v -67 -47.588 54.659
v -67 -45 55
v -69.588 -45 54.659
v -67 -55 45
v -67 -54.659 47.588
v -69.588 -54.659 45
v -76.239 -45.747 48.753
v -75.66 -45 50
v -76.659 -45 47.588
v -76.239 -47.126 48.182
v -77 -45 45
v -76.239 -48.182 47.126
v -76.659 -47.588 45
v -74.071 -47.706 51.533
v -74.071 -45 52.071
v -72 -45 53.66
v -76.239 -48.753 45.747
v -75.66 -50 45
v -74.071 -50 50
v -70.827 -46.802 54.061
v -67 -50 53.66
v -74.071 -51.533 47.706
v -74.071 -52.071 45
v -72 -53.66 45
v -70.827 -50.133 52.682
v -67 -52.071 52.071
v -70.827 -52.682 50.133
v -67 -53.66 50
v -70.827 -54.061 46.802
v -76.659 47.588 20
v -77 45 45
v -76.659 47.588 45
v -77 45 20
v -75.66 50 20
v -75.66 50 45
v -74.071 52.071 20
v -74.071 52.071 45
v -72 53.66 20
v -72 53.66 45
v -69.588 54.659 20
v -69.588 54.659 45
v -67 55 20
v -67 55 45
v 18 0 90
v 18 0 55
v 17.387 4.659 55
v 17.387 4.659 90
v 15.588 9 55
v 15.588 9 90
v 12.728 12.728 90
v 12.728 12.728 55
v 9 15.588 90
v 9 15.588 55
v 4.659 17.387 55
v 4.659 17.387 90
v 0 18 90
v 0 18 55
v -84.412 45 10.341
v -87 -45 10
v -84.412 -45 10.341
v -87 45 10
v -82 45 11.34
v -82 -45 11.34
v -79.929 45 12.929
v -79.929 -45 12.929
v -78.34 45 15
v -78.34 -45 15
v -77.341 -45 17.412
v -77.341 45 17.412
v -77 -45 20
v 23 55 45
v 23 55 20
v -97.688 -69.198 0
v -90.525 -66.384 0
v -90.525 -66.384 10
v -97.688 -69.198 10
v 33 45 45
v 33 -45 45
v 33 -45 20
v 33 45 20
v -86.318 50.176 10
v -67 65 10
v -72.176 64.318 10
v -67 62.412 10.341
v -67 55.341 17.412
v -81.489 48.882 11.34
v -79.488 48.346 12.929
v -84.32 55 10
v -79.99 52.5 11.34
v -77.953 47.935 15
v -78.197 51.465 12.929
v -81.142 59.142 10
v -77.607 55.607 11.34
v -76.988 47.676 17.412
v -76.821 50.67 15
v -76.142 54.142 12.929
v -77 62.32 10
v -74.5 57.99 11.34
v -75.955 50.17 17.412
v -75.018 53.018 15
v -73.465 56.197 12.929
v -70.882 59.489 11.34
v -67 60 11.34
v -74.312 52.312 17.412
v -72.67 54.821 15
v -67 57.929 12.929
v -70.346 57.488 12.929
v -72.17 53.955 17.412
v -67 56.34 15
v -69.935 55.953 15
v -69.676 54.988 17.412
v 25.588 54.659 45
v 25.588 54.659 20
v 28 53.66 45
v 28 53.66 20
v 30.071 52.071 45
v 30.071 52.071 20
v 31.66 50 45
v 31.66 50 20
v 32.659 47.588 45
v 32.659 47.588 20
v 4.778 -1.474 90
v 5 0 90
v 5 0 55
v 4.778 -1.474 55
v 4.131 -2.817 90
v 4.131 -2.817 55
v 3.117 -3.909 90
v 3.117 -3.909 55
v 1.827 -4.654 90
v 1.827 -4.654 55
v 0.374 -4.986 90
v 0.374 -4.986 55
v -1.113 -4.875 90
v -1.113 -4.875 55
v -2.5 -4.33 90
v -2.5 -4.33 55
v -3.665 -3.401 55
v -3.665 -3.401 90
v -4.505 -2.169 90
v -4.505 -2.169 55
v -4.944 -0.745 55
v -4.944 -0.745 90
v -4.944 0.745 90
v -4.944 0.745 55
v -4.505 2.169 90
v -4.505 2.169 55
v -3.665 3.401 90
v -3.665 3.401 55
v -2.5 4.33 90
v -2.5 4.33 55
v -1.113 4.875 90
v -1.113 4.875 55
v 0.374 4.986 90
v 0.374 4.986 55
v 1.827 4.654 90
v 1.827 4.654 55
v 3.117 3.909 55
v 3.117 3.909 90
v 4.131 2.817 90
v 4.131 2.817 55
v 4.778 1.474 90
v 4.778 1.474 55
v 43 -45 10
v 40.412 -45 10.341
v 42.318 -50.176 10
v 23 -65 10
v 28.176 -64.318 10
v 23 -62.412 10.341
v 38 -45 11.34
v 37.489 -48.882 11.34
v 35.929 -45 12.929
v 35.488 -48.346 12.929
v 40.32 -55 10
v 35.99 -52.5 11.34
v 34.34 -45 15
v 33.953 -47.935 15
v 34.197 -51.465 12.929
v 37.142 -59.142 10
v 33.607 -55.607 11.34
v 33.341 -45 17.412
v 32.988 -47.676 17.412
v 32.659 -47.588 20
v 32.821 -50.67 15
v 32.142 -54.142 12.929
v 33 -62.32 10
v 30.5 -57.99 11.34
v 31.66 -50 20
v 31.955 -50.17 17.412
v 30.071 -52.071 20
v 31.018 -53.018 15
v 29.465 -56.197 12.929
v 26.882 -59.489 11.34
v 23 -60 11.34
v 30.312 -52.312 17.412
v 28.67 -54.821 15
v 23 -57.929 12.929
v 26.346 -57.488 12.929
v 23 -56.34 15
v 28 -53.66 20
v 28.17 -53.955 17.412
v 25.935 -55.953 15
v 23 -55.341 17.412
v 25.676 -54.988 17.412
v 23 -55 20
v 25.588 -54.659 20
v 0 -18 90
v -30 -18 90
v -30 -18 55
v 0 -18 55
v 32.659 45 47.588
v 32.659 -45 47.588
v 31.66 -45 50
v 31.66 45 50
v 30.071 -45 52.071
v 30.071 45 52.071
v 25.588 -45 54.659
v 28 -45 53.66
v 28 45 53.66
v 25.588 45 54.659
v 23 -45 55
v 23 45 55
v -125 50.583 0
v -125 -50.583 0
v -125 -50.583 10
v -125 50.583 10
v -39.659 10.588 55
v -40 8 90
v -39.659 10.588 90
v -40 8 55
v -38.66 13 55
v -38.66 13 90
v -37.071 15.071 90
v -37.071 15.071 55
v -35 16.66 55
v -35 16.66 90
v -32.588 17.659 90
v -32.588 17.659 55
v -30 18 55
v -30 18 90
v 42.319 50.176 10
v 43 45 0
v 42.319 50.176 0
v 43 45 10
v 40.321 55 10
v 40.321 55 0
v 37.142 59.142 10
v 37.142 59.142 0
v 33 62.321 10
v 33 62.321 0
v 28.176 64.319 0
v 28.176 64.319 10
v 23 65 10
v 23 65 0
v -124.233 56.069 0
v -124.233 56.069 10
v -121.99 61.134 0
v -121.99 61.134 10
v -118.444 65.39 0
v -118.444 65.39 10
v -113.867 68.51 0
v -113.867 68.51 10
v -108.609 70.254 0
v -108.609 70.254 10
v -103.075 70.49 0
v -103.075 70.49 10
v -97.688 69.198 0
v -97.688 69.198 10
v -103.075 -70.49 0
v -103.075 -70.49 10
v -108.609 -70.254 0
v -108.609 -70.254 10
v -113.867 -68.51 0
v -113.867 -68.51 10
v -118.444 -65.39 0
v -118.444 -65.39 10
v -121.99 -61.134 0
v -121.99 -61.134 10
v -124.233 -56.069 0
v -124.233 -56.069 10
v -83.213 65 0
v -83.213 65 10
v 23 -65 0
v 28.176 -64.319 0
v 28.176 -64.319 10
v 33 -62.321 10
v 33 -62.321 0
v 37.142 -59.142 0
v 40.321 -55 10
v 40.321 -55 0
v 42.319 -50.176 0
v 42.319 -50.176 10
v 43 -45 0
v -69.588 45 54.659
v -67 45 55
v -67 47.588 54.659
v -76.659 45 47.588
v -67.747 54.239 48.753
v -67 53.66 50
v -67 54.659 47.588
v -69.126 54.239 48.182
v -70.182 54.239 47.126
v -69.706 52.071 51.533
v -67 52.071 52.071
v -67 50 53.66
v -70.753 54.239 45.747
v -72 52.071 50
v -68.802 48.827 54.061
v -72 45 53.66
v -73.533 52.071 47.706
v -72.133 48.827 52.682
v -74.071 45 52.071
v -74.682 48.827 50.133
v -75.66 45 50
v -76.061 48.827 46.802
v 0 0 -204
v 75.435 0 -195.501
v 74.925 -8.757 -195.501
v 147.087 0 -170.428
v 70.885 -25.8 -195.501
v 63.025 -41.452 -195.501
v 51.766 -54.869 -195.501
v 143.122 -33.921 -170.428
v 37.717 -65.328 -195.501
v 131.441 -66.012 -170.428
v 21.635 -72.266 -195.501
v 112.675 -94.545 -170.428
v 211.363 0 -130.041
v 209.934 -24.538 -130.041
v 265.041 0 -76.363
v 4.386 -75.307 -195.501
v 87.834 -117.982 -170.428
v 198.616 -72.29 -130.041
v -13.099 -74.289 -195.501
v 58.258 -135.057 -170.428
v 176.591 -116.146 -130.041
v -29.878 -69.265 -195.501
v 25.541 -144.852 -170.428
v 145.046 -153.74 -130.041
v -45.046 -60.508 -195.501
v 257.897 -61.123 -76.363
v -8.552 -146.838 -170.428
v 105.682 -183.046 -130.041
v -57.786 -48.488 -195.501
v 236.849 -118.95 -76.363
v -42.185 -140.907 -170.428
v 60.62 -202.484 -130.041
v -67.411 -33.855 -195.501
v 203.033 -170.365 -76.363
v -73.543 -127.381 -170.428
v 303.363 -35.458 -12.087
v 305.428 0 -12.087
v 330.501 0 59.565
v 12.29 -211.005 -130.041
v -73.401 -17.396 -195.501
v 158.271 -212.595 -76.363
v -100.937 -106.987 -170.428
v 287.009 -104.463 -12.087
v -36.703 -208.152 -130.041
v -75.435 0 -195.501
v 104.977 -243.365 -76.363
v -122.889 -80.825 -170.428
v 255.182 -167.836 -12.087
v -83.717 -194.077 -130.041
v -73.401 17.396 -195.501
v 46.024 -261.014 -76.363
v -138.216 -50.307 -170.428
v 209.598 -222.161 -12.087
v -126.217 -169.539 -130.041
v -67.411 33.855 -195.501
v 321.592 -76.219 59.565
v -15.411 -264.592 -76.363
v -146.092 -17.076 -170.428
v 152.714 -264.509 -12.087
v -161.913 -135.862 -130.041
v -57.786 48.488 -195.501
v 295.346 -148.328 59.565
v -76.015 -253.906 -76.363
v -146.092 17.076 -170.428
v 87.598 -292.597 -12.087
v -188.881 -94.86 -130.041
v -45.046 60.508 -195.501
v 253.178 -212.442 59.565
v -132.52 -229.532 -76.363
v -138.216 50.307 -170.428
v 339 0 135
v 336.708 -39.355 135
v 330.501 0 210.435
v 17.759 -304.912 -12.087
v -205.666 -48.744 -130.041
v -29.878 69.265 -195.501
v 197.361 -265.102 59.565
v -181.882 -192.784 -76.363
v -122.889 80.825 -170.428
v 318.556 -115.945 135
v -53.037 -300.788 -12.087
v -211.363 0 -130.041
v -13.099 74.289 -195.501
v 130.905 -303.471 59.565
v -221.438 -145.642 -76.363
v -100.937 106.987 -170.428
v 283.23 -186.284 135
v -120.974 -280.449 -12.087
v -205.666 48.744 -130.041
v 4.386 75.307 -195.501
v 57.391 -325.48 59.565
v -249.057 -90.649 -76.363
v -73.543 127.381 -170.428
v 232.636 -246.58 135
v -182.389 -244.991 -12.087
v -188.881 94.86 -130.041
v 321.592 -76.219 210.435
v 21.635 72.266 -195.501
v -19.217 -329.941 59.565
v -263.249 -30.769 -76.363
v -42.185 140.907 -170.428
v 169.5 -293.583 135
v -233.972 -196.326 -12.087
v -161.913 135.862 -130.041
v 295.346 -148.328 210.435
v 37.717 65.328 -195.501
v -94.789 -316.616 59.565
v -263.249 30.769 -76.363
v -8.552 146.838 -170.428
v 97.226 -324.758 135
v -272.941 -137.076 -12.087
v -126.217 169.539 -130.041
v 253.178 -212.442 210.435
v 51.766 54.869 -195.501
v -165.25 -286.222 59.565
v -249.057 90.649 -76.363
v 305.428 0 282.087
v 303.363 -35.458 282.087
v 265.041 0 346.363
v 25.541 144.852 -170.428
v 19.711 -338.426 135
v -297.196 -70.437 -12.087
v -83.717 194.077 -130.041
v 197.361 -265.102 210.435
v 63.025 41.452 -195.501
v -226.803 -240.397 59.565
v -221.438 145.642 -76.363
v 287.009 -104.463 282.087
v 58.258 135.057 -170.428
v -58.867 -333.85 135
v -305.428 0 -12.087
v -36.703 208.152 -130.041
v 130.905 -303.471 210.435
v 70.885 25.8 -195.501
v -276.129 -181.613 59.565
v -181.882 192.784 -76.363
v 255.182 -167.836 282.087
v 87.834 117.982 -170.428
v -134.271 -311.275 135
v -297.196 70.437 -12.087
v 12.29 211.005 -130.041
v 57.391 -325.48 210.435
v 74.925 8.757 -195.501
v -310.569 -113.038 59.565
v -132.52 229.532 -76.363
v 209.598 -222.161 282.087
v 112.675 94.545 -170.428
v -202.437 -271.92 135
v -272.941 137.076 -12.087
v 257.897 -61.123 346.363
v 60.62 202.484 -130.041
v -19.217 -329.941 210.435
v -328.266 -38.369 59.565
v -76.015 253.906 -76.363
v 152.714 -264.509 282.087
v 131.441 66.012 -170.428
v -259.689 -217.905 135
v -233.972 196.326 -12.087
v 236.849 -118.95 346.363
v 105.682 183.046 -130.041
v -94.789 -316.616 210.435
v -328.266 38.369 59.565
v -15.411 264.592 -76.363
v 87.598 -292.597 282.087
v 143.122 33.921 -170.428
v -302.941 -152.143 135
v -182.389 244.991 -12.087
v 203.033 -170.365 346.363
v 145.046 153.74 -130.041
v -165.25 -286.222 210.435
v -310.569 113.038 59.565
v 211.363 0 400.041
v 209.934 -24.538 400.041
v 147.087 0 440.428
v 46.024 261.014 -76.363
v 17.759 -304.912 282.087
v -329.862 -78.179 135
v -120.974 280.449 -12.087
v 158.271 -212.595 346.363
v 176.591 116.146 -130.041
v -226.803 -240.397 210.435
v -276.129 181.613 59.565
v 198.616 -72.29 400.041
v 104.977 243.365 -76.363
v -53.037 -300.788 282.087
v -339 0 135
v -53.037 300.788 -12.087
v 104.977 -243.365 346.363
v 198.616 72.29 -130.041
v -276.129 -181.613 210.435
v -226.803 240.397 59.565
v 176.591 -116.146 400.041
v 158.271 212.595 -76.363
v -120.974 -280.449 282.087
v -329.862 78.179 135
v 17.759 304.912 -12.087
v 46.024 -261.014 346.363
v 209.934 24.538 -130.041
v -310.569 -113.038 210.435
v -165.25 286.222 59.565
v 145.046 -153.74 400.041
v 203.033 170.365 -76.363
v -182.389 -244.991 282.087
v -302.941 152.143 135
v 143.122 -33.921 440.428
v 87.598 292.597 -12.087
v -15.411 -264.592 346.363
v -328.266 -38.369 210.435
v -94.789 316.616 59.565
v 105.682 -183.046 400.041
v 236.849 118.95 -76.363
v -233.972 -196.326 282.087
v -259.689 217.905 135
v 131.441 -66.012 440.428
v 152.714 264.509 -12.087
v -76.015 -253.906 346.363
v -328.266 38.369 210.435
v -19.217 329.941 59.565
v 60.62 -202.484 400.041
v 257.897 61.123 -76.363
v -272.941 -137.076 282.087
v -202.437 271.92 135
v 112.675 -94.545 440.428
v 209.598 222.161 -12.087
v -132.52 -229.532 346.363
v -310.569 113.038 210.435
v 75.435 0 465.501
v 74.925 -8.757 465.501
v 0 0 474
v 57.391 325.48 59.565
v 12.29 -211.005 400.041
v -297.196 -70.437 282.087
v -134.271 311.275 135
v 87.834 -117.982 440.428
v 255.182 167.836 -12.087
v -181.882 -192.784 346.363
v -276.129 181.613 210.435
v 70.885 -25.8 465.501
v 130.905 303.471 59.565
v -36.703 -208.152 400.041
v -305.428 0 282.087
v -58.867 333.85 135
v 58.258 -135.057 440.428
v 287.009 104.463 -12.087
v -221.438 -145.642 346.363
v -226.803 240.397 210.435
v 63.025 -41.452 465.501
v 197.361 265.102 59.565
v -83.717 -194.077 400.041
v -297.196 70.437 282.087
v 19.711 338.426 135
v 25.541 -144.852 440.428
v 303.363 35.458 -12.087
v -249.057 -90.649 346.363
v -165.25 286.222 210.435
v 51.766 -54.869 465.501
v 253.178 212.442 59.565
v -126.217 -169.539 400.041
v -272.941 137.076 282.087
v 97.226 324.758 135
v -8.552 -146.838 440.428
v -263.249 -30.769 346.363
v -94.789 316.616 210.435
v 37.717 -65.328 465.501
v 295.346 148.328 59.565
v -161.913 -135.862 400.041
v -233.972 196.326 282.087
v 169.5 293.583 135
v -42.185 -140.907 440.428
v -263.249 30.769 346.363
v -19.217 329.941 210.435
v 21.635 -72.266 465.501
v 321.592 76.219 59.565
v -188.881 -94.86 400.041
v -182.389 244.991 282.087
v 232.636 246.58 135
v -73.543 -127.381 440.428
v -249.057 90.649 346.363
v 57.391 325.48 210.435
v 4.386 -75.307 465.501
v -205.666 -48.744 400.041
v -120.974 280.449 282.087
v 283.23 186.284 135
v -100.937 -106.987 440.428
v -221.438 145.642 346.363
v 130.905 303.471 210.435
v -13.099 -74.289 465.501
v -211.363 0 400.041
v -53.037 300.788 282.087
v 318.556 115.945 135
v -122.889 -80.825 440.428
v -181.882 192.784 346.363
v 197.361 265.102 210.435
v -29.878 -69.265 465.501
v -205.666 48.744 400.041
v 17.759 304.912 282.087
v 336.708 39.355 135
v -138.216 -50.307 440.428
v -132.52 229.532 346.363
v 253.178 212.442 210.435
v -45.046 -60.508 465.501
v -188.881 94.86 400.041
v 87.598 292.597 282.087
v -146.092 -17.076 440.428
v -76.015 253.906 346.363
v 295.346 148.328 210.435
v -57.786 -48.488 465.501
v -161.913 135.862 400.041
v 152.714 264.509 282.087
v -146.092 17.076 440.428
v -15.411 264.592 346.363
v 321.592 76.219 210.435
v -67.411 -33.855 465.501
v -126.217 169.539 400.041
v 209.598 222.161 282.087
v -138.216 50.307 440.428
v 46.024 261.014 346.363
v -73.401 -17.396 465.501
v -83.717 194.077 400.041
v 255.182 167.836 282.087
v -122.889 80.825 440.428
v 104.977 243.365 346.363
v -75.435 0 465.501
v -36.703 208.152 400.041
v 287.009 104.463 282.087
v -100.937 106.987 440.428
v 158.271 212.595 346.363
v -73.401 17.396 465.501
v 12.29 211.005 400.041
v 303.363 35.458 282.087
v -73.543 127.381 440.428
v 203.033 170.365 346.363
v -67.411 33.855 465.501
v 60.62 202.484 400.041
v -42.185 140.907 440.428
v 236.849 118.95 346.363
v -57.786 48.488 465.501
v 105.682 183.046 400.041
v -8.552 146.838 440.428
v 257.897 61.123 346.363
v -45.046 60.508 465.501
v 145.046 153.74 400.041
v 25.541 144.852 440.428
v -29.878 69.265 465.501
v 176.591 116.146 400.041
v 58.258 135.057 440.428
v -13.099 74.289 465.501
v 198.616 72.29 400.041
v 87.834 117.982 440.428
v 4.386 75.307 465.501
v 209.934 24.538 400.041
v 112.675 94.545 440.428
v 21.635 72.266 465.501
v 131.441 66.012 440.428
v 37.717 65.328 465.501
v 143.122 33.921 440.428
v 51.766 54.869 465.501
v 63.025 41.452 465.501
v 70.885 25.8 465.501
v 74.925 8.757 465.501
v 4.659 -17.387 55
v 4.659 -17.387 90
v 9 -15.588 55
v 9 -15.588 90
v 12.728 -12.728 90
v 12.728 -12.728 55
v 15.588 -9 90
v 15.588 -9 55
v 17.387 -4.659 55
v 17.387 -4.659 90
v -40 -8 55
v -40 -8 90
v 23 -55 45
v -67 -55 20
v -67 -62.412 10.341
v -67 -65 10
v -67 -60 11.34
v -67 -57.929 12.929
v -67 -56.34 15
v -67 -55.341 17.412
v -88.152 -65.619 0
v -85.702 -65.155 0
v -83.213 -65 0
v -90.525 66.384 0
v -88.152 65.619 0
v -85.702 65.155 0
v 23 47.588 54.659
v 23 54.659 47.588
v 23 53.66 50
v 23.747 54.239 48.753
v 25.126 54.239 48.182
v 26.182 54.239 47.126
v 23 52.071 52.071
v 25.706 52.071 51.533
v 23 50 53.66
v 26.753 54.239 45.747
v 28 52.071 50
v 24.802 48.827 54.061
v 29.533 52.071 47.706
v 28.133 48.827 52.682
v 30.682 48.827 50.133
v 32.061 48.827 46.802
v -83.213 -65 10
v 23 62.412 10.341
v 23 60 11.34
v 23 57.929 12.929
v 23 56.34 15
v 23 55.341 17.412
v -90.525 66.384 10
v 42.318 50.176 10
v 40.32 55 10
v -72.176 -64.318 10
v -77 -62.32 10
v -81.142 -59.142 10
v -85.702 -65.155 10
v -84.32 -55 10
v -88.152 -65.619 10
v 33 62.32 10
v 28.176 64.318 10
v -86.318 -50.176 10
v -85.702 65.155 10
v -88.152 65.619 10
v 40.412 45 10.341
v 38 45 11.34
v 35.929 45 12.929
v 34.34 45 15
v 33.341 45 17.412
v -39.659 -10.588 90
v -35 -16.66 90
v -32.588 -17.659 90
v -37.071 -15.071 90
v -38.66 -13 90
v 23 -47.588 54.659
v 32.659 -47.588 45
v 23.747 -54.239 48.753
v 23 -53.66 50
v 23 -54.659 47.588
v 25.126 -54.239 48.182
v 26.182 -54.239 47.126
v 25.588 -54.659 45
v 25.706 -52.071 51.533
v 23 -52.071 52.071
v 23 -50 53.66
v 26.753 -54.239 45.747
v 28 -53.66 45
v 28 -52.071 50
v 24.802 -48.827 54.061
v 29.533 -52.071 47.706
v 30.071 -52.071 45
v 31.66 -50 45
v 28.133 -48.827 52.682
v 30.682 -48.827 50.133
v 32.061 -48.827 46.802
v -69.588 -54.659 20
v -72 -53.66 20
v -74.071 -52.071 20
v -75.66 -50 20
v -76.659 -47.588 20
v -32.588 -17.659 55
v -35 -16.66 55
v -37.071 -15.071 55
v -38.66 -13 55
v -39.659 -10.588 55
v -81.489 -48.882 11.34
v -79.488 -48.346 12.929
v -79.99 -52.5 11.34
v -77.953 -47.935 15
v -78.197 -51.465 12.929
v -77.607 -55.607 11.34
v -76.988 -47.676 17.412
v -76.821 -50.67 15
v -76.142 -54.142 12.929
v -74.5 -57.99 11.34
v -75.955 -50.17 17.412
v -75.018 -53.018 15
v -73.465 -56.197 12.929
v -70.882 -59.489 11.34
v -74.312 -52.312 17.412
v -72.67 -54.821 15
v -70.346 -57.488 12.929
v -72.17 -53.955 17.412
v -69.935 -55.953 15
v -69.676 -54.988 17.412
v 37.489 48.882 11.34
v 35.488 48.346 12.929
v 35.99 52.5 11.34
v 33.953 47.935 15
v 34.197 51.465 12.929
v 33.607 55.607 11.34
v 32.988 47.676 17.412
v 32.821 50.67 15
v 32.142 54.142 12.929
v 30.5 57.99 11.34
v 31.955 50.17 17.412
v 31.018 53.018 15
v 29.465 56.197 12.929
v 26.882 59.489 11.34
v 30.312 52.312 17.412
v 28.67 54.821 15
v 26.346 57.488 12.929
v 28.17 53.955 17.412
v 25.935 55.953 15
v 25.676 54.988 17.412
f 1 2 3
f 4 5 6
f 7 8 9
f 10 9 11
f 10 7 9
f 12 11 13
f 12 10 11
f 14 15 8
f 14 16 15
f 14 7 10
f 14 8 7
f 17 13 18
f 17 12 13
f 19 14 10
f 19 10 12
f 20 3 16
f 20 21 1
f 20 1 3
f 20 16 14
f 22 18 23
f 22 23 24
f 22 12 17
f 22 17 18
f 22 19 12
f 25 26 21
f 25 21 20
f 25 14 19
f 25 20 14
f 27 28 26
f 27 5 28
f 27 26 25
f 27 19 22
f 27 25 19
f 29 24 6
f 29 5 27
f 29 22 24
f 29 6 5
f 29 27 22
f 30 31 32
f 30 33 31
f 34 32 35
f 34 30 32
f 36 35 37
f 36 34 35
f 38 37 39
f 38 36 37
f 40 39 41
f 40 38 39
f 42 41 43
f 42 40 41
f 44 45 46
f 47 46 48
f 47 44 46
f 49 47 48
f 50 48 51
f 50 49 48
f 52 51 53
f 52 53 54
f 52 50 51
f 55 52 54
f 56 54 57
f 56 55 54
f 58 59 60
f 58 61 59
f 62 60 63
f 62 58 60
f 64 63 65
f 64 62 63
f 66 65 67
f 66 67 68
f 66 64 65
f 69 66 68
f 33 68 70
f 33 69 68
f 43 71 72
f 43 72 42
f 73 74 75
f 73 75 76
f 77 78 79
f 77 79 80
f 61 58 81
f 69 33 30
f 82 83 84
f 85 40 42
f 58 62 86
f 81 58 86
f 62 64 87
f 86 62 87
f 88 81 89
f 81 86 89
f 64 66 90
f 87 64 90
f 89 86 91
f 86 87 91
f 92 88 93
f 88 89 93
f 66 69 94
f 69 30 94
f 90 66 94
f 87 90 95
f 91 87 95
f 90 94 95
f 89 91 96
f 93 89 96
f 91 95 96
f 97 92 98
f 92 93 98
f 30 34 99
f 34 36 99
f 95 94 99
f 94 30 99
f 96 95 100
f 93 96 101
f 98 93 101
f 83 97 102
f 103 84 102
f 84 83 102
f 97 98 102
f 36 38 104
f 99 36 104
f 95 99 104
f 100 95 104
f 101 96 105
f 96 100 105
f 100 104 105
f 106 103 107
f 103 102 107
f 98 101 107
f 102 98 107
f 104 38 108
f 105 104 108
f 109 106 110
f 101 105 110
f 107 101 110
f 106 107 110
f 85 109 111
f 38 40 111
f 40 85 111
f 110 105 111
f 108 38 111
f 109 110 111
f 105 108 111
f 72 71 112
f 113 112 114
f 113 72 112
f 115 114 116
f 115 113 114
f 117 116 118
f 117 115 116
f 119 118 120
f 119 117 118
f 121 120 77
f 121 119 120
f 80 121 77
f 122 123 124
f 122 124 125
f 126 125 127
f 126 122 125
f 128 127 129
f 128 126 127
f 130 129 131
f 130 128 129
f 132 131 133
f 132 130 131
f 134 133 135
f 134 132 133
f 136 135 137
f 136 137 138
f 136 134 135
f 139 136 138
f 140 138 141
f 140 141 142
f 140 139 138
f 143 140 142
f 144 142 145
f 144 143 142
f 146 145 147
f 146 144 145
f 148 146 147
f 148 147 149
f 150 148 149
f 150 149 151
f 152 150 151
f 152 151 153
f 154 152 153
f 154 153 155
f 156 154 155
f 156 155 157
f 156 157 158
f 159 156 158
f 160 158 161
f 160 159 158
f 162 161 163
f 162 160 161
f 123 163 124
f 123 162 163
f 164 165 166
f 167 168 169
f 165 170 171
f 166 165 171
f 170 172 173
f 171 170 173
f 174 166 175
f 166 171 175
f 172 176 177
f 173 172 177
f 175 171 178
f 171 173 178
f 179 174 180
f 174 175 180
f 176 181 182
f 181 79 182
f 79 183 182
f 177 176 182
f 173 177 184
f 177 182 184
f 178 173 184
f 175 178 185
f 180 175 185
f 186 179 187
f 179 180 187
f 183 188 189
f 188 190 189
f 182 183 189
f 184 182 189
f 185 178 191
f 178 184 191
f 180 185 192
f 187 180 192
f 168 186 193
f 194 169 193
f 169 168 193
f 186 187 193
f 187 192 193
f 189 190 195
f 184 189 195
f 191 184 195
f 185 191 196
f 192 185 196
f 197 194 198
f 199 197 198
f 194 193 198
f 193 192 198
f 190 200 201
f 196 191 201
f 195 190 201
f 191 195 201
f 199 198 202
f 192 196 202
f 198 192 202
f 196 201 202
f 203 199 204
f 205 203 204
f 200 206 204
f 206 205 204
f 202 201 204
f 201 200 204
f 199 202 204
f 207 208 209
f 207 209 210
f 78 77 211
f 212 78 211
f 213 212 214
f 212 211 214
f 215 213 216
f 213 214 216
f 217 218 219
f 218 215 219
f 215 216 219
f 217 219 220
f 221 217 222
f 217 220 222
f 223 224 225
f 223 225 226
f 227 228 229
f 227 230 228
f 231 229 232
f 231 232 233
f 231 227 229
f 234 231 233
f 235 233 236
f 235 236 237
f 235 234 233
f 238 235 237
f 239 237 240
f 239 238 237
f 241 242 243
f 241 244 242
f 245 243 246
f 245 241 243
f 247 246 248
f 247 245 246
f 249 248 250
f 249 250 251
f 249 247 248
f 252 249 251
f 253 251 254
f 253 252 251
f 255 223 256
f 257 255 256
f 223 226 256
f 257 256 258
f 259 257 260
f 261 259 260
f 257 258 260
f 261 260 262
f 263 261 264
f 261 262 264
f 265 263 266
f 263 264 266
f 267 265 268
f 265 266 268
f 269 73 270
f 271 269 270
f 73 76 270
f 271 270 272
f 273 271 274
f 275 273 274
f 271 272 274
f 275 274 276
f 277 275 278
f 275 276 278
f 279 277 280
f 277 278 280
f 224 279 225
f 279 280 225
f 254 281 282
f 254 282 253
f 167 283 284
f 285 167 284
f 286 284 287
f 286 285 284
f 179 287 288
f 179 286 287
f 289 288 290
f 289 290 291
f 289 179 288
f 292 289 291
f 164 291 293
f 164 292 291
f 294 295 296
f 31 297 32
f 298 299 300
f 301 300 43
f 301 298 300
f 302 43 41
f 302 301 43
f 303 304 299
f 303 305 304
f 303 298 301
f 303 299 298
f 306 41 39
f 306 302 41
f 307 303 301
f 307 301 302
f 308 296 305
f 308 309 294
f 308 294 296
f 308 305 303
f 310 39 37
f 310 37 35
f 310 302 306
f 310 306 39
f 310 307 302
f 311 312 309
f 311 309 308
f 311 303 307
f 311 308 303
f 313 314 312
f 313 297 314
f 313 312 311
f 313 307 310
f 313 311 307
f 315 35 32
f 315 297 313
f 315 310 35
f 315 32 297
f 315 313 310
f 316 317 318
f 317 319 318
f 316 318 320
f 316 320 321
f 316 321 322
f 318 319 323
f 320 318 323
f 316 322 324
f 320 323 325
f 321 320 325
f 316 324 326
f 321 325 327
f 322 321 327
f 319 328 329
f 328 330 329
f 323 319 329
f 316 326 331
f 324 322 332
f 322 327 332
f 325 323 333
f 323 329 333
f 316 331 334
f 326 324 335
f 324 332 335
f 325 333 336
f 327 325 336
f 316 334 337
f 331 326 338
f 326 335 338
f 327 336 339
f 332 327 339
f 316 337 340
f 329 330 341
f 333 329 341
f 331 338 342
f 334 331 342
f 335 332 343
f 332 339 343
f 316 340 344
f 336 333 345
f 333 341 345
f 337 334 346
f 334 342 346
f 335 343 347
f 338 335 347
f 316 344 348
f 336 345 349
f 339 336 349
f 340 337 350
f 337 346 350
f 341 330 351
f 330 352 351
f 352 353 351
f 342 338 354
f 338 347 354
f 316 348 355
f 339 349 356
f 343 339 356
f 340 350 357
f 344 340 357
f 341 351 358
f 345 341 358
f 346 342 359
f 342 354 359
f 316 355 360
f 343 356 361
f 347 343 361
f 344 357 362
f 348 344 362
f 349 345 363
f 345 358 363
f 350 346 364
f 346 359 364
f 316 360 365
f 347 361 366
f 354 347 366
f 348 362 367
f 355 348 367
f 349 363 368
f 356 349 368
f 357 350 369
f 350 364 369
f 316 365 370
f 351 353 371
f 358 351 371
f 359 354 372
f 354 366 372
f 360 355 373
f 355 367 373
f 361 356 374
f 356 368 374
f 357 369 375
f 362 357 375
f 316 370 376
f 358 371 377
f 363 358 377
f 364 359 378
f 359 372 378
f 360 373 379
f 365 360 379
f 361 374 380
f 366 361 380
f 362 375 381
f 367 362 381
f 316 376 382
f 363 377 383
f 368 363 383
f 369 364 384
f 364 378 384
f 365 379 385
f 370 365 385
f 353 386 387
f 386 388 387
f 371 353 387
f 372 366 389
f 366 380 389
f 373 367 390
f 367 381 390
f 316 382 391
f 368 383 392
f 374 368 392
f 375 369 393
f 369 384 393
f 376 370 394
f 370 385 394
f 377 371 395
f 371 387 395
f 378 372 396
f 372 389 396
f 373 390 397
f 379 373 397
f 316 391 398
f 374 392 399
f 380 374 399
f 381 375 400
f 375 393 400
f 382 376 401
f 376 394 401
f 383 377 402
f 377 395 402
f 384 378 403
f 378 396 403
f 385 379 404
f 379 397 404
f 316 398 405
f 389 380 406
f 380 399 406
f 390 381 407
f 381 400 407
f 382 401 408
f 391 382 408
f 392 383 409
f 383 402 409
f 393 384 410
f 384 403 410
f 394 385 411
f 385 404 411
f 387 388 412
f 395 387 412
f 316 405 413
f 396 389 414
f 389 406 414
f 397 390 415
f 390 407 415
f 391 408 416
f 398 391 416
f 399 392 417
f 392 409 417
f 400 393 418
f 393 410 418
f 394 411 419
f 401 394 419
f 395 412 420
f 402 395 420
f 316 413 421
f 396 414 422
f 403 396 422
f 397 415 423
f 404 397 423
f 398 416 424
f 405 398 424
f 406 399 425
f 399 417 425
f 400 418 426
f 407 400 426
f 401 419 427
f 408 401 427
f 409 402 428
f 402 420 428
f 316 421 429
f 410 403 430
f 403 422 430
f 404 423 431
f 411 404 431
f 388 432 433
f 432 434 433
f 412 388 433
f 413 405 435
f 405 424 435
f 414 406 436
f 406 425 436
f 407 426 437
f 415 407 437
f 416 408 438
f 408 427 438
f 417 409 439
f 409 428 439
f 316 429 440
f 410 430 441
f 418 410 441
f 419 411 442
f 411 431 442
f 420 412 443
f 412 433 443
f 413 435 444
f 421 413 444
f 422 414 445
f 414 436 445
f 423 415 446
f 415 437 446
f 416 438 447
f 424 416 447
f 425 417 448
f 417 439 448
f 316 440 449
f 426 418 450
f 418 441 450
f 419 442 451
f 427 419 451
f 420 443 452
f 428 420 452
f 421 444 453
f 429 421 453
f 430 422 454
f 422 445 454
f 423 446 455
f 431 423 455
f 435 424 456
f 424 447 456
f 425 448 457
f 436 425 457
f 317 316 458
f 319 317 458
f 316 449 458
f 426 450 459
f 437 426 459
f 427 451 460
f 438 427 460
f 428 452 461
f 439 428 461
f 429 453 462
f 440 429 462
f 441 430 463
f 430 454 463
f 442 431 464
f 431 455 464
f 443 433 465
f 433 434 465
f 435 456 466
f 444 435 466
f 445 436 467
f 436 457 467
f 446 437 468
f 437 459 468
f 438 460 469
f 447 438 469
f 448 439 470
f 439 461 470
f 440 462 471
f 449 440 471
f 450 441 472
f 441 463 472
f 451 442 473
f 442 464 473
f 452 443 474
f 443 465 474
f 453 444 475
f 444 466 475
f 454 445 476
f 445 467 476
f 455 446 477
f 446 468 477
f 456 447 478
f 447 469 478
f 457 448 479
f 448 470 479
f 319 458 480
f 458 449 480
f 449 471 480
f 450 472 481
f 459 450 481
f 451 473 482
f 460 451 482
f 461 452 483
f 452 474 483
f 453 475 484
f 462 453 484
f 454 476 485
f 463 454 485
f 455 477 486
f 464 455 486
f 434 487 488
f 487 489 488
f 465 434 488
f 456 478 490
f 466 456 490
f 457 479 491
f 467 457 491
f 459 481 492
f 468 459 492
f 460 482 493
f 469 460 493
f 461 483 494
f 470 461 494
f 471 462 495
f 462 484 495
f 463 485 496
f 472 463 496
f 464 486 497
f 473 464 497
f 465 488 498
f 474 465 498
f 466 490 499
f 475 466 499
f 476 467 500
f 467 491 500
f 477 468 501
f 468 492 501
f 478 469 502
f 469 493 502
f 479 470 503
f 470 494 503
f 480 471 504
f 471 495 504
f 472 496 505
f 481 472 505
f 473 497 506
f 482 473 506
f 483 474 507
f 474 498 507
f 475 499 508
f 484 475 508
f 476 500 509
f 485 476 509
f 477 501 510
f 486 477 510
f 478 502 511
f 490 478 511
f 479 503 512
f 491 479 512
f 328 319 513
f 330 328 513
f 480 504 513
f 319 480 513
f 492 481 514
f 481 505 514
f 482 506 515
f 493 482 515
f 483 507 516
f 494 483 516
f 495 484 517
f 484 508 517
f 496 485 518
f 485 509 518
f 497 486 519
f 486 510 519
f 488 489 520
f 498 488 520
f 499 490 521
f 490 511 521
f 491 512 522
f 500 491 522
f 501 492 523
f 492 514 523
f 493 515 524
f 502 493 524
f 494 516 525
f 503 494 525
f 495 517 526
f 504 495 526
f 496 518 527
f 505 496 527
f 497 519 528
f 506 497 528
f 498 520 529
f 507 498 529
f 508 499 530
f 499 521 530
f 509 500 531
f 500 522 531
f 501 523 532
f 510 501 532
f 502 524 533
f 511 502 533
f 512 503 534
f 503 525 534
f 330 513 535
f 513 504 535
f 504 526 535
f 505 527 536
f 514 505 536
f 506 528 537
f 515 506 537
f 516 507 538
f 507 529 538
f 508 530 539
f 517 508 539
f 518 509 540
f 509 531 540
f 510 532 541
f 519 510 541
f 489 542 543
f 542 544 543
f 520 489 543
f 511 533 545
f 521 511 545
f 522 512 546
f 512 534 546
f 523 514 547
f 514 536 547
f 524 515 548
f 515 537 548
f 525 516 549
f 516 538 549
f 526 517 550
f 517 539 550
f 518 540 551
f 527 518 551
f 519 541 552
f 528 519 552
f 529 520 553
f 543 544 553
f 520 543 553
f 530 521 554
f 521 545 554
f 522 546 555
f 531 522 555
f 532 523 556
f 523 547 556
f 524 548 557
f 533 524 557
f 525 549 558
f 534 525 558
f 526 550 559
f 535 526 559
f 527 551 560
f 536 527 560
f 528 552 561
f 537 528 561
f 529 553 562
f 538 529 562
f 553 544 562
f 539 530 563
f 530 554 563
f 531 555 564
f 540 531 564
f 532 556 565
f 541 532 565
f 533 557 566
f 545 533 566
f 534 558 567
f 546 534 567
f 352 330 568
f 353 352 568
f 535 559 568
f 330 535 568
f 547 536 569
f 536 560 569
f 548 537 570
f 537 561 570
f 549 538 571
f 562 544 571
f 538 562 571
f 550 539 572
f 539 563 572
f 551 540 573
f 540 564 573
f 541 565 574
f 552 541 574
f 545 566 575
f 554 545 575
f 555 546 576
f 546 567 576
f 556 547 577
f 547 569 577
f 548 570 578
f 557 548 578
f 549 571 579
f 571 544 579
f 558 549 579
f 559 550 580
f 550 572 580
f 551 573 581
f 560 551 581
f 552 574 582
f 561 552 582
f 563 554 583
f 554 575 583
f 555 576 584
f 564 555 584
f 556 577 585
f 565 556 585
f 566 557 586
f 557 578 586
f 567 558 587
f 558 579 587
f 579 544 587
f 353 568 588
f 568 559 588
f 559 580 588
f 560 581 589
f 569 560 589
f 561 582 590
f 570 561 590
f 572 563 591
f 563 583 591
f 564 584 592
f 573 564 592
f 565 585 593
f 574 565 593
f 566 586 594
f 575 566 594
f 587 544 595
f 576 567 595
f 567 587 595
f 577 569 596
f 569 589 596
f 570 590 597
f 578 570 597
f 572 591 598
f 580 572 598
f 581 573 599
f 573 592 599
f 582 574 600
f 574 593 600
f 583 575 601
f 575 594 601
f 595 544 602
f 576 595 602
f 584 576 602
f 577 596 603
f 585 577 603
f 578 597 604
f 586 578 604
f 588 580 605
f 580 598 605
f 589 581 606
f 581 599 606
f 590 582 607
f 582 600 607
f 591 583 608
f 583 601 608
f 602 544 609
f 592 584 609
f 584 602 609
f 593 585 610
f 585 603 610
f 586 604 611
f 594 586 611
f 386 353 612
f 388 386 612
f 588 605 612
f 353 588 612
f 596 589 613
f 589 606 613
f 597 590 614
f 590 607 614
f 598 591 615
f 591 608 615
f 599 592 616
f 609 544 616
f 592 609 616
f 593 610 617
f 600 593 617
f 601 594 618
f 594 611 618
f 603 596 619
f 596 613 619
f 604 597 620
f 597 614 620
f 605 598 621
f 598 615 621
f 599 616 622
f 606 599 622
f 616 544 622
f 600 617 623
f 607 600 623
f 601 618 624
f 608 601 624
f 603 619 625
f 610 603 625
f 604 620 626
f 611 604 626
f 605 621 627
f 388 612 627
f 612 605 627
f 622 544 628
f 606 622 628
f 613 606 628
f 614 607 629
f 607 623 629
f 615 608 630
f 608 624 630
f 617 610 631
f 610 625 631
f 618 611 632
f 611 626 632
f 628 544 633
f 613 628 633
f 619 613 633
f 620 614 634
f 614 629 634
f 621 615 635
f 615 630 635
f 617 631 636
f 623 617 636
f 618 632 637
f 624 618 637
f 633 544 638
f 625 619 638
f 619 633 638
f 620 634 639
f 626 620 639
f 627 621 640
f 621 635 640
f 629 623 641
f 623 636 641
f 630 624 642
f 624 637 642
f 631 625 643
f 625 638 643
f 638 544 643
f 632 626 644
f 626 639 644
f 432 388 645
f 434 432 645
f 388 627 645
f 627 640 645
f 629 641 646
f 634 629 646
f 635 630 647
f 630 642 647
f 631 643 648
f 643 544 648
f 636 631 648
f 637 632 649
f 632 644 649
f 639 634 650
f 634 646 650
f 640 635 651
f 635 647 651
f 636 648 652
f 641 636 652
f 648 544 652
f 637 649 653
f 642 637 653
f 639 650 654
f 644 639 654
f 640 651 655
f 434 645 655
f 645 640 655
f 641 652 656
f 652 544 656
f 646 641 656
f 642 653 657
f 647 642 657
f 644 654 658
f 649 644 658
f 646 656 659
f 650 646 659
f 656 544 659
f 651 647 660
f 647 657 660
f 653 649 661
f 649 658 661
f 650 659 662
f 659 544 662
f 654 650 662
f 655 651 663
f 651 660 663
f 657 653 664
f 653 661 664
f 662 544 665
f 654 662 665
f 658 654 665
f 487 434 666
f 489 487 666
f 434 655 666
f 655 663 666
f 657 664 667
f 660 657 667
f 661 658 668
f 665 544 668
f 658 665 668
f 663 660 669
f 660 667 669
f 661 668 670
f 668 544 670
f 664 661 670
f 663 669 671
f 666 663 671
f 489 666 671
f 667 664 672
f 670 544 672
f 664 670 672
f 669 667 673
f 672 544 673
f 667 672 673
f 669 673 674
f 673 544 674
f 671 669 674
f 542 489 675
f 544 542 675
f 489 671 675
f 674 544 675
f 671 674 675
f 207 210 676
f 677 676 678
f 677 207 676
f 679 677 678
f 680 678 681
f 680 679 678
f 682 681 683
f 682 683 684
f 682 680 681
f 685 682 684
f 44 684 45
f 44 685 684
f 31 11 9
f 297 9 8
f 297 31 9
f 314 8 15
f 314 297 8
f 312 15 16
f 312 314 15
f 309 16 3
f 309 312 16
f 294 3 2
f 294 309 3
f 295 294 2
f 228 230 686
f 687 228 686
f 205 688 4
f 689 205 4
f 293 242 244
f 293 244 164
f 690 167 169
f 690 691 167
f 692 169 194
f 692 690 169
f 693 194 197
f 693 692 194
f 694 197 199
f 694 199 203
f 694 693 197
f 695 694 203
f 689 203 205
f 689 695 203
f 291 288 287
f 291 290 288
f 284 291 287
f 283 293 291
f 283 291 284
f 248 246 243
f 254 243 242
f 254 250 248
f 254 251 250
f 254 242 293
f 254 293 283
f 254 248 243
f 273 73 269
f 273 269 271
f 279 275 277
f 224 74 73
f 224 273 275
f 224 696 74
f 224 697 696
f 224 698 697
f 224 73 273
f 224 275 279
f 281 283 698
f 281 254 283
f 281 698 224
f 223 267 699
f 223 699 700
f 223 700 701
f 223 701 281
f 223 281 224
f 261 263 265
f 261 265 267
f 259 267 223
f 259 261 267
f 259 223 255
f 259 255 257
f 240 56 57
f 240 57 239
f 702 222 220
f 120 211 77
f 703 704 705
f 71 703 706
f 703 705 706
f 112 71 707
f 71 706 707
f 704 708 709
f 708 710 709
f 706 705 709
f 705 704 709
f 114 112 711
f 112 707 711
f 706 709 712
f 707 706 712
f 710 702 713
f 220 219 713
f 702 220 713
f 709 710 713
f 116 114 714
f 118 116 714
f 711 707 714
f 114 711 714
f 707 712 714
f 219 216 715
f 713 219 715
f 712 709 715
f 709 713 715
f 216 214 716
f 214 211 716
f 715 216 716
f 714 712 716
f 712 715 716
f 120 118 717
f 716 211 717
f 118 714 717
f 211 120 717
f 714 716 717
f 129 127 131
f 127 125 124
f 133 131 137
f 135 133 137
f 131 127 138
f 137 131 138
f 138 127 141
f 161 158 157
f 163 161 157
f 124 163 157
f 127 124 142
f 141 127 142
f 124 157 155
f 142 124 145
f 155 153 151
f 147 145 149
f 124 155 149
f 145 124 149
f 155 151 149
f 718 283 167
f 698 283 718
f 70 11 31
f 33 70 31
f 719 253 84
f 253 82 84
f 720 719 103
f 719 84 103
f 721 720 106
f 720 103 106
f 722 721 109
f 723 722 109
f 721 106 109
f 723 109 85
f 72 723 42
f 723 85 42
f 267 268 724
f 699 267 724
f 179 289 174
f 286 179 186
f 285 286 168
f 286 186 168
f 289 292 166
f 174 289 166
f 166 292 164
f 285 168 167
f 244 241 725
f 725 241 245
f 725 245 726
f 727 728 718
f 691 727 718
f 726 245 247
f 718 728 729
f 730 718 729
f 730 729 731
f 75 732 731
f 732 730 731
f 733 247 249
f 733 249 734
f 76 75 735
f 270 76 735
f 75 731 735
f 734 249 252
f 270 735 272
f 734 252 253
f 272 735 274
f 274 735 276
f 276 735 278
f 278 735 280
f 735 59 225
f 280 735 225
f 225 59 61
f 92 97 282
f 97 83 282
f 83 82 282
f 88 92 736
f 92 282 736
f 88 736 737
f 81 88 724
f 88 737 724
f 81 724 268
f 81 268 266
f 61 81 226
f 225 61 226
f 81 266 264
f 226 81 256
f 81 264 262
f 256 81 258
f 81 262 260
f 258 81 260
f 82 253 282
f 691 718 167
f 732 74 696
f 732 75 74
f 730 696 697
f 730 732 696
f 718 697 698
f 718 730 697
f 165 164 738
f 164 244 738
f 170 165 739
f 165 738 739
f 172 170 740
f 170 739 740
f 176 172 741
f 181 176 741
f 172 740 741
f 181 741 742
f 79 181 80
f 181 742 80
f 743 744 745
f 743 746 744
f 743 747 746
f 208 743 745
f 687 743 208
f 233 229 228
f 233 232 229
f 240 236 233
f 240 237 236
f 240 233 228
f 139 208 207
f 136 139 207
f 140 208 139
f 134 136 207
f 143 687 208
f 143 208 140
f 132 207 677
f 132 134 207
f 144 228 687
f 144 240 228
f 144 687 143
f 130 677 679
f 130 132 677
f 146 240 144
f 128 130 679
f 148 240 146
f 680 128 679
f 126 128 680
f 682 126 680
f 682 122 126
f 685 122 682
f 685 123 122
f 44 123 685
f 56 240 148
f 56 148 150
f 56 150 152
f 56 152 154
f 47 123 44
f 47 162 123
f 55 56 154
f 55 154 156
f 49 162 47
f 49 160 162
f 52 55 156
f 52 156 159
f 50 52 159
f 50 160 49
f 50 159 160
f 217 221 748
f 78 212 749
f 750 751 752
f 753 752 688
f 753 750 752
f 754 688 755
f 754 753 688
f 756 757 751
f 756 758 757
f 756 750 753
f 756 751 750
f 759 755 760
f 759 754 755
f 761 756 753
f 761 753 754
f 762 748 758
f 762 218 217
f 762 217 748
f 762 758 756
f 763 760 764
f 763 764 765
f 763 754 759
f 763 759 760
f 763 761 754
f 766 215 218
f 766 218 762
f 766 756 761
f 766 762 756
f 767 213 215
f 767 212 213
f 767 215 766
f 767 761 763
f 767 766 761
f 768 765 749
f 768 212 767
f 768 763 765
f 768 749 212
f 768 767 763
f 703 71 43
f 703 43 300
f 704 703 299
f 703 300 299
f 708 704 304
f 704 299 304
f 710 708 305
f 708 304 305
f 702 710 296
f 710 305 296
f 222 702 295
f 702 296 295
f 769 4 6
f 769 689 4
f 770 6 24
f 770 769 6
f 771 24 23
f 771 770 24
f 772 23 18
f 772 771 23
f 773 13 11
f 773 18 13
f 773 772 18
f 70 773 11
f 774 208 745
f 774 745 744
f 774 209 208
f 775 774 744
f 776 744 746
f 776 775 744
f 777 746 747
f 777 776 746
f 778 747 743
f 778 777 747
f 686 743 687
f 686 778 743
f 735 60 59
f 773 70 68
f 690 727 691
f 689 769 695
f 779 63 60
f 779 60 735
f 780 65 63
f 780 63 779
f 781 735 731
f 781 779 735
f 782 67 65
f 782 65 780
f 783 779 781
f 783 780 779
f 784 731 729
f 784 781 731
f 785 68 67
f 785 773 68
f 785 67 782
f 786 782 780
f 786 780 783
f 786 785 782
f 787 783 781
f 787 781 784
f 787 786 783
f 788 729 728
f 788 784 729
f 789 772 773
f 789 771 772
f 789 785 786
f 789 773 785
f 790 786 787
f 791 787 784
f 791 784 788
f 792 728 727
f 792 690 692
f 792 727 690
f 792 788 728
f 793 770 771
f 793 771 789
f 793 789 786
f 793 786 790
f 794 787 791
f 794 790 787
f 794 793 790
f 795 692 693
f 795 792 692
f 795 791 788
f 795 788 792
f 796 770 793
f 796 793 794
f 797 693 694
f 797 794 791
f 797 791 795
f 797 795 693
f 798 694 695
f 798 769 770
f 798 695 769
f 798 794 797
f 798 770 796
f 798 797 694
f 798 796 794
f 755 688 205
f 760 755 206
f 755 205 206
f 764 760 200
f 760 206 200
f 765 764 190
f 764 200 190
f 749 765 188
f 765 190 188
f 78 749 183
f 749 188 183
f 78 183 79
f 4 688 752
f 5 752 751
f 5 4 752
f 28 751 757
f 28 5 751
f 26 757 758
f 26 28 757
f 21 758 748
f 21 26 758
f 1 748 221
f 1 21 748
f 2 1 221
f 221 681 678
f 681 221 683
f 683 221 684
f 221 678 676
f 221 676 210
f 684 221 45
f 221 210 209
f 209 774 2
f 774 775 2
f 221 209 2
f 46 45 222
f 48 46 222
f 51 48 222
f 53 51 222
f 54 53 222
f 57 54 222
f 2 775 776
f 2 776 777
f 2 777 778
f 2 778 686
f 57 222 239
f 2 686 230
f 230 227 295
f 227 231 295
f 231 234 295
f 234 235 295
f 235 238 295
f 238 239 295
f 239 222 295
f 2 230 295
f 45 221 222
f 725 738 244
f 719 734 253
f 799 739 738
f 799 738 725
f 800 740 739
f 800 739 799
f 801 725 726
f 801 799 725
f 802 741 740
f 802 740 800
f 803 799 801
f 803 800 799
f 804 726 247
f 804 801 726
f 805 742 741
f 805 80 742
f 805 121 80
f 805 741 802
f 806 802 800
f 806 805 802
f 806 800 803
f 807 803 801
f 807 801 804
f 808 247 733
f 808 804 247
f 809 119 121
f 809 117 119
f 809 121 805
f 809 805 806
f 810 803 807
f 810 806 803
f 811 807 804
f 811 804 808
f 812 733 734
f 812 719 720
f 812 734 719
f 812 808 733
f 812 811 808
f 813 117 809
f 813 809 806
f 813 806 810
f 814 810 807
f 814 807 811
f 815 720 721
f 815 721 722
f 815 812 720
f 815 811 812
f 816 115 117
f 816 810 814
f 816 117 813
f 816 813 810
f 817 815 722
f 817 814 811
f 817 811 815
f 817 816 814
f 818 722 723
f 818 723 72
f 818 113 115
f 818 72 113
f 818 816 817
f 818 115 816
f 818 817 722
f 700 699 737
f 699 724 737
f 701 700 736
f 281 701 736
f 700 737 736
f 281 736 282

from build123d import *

# Parameters (mm, degrees)
BOSS_EXTRUDE1_DEPTH = 35
SKETCH5_W           = 110
SKETCH5_H           = 110
BOSS_EXTRUDE2_DEPTH = 55
BOSS_EXTRUDE3_DEPTH = 10
FILLET1_R           = 20
FILLET4_R           = 10


with BuildPart() as part:
    # Sketch4 → Boss-Extrude1 (new body)
    with BuildSketch(Plane.XY.offset(90)):
        with BuildLine():
            ThreePointArc((18, 0), (12.727922061, 12.727922061), (0, 18))
            Line((0, 18), (-40, 18))
            Line((-40, 18), (-40, 0))
            Line((-40, 0), (-5, 0))
            ThreePointArc((-5, 0), (0, 5), (5, 0))
            Line((5, 0), (18, 0))
        make_face()
        with BuildLine():
            ThreePointArc((0, -18), (12.727922061, -12.727922061), (18, 0))
            Line((18, 0), (5, 0))
            ThreePointArc((5, 0), (0, -5), (-5, 0))
            Line((-5, 0), (-40, 0))
            Line((-40, 0), (-40, -18))
            Line((-40, -18), (0, -18))
        make_face()
    extrude(amount=-BOSS_EXTRUDE1_DEPTH)

    # Sketch5 → Boss-Extrude2 (add)
    with BuildSketch(Plane(origin=(0, 0, 55), x_dir=(-1, 0, 0), z_dir=(0, 0, -1))):
        with Locations((22, 0)):
            Rectangle(SKETCH5_W, SKETCH5_H)
    extrude(amount=BOSS_EXTRUDE2_DEPTH)

    # Sketch7 → Boss-Extrude3 (add)
    with BuildSketch(Plane(origin=(0, 0, 0), x_dir=(-1, 0, 0), z_dir=(0, 0, -1))):
        Polygon((87, -65), (125, -79.925557452), (125, 79.925557452), (87, 65), (-43, 65), (-43, -65), align=None)
    extrude(amount=-BOSS_EXTRUDE3_DEPTH)

    # Fillet1
    fillet1_edges = [part.edges().sort_by_distance(p)[0] for p in [
        (-125, -79.925557452, 5),
        (-87, -65, 5),
        (43, -65, 5),
        (43, 65, 5),
        (-87, 65, 5),
        (-125, 79.925557452, 5),
    ]]
    fillet(fillet1_edges, radius=FILLET1_R)

    # Fillet4
    fillet4_edges = [part.edges().sort_by_distance(p)[0] for p in [
        (-40, -18, 72.5),
        (-40, 18, 72.5),
        (33, 0, 55),
        (-22, -55, 55),
        (-77, 0, 55),
        (-22, 55, 55),
        (33, -55, 32.5),
        (33, 55, 32.5),
        (33, 0, 10),
        (-77, -55, 32.5),
        (-77, 55, 32.5),
        (-77, 0, 10),
        (-22, 55, 10),
        (-22, -55, 10),
    ]]
    fillet(fillet4_edges, radius=FILLET4_R - 0.0001)  # a hair under: the kernel refuses the full size


with BuildPart() as body_2:
    # Sketch8 → Revolve1 (revolve)
    with BuildSketch(Plane(origin=(0, 0, 0), x_dir=(1, 0, 0), z_dir=(0, 1, 0))):
        with BuildLine():
            Line((0, -474), (0, 204))
            ThreePointArc((0, 204), (339, -135), (0, -474))
        make_face()
    revolve(axis=Axis((0, 0, 474), (0, 0, -1)))


solid = Compound([part.part, body_2.part])
